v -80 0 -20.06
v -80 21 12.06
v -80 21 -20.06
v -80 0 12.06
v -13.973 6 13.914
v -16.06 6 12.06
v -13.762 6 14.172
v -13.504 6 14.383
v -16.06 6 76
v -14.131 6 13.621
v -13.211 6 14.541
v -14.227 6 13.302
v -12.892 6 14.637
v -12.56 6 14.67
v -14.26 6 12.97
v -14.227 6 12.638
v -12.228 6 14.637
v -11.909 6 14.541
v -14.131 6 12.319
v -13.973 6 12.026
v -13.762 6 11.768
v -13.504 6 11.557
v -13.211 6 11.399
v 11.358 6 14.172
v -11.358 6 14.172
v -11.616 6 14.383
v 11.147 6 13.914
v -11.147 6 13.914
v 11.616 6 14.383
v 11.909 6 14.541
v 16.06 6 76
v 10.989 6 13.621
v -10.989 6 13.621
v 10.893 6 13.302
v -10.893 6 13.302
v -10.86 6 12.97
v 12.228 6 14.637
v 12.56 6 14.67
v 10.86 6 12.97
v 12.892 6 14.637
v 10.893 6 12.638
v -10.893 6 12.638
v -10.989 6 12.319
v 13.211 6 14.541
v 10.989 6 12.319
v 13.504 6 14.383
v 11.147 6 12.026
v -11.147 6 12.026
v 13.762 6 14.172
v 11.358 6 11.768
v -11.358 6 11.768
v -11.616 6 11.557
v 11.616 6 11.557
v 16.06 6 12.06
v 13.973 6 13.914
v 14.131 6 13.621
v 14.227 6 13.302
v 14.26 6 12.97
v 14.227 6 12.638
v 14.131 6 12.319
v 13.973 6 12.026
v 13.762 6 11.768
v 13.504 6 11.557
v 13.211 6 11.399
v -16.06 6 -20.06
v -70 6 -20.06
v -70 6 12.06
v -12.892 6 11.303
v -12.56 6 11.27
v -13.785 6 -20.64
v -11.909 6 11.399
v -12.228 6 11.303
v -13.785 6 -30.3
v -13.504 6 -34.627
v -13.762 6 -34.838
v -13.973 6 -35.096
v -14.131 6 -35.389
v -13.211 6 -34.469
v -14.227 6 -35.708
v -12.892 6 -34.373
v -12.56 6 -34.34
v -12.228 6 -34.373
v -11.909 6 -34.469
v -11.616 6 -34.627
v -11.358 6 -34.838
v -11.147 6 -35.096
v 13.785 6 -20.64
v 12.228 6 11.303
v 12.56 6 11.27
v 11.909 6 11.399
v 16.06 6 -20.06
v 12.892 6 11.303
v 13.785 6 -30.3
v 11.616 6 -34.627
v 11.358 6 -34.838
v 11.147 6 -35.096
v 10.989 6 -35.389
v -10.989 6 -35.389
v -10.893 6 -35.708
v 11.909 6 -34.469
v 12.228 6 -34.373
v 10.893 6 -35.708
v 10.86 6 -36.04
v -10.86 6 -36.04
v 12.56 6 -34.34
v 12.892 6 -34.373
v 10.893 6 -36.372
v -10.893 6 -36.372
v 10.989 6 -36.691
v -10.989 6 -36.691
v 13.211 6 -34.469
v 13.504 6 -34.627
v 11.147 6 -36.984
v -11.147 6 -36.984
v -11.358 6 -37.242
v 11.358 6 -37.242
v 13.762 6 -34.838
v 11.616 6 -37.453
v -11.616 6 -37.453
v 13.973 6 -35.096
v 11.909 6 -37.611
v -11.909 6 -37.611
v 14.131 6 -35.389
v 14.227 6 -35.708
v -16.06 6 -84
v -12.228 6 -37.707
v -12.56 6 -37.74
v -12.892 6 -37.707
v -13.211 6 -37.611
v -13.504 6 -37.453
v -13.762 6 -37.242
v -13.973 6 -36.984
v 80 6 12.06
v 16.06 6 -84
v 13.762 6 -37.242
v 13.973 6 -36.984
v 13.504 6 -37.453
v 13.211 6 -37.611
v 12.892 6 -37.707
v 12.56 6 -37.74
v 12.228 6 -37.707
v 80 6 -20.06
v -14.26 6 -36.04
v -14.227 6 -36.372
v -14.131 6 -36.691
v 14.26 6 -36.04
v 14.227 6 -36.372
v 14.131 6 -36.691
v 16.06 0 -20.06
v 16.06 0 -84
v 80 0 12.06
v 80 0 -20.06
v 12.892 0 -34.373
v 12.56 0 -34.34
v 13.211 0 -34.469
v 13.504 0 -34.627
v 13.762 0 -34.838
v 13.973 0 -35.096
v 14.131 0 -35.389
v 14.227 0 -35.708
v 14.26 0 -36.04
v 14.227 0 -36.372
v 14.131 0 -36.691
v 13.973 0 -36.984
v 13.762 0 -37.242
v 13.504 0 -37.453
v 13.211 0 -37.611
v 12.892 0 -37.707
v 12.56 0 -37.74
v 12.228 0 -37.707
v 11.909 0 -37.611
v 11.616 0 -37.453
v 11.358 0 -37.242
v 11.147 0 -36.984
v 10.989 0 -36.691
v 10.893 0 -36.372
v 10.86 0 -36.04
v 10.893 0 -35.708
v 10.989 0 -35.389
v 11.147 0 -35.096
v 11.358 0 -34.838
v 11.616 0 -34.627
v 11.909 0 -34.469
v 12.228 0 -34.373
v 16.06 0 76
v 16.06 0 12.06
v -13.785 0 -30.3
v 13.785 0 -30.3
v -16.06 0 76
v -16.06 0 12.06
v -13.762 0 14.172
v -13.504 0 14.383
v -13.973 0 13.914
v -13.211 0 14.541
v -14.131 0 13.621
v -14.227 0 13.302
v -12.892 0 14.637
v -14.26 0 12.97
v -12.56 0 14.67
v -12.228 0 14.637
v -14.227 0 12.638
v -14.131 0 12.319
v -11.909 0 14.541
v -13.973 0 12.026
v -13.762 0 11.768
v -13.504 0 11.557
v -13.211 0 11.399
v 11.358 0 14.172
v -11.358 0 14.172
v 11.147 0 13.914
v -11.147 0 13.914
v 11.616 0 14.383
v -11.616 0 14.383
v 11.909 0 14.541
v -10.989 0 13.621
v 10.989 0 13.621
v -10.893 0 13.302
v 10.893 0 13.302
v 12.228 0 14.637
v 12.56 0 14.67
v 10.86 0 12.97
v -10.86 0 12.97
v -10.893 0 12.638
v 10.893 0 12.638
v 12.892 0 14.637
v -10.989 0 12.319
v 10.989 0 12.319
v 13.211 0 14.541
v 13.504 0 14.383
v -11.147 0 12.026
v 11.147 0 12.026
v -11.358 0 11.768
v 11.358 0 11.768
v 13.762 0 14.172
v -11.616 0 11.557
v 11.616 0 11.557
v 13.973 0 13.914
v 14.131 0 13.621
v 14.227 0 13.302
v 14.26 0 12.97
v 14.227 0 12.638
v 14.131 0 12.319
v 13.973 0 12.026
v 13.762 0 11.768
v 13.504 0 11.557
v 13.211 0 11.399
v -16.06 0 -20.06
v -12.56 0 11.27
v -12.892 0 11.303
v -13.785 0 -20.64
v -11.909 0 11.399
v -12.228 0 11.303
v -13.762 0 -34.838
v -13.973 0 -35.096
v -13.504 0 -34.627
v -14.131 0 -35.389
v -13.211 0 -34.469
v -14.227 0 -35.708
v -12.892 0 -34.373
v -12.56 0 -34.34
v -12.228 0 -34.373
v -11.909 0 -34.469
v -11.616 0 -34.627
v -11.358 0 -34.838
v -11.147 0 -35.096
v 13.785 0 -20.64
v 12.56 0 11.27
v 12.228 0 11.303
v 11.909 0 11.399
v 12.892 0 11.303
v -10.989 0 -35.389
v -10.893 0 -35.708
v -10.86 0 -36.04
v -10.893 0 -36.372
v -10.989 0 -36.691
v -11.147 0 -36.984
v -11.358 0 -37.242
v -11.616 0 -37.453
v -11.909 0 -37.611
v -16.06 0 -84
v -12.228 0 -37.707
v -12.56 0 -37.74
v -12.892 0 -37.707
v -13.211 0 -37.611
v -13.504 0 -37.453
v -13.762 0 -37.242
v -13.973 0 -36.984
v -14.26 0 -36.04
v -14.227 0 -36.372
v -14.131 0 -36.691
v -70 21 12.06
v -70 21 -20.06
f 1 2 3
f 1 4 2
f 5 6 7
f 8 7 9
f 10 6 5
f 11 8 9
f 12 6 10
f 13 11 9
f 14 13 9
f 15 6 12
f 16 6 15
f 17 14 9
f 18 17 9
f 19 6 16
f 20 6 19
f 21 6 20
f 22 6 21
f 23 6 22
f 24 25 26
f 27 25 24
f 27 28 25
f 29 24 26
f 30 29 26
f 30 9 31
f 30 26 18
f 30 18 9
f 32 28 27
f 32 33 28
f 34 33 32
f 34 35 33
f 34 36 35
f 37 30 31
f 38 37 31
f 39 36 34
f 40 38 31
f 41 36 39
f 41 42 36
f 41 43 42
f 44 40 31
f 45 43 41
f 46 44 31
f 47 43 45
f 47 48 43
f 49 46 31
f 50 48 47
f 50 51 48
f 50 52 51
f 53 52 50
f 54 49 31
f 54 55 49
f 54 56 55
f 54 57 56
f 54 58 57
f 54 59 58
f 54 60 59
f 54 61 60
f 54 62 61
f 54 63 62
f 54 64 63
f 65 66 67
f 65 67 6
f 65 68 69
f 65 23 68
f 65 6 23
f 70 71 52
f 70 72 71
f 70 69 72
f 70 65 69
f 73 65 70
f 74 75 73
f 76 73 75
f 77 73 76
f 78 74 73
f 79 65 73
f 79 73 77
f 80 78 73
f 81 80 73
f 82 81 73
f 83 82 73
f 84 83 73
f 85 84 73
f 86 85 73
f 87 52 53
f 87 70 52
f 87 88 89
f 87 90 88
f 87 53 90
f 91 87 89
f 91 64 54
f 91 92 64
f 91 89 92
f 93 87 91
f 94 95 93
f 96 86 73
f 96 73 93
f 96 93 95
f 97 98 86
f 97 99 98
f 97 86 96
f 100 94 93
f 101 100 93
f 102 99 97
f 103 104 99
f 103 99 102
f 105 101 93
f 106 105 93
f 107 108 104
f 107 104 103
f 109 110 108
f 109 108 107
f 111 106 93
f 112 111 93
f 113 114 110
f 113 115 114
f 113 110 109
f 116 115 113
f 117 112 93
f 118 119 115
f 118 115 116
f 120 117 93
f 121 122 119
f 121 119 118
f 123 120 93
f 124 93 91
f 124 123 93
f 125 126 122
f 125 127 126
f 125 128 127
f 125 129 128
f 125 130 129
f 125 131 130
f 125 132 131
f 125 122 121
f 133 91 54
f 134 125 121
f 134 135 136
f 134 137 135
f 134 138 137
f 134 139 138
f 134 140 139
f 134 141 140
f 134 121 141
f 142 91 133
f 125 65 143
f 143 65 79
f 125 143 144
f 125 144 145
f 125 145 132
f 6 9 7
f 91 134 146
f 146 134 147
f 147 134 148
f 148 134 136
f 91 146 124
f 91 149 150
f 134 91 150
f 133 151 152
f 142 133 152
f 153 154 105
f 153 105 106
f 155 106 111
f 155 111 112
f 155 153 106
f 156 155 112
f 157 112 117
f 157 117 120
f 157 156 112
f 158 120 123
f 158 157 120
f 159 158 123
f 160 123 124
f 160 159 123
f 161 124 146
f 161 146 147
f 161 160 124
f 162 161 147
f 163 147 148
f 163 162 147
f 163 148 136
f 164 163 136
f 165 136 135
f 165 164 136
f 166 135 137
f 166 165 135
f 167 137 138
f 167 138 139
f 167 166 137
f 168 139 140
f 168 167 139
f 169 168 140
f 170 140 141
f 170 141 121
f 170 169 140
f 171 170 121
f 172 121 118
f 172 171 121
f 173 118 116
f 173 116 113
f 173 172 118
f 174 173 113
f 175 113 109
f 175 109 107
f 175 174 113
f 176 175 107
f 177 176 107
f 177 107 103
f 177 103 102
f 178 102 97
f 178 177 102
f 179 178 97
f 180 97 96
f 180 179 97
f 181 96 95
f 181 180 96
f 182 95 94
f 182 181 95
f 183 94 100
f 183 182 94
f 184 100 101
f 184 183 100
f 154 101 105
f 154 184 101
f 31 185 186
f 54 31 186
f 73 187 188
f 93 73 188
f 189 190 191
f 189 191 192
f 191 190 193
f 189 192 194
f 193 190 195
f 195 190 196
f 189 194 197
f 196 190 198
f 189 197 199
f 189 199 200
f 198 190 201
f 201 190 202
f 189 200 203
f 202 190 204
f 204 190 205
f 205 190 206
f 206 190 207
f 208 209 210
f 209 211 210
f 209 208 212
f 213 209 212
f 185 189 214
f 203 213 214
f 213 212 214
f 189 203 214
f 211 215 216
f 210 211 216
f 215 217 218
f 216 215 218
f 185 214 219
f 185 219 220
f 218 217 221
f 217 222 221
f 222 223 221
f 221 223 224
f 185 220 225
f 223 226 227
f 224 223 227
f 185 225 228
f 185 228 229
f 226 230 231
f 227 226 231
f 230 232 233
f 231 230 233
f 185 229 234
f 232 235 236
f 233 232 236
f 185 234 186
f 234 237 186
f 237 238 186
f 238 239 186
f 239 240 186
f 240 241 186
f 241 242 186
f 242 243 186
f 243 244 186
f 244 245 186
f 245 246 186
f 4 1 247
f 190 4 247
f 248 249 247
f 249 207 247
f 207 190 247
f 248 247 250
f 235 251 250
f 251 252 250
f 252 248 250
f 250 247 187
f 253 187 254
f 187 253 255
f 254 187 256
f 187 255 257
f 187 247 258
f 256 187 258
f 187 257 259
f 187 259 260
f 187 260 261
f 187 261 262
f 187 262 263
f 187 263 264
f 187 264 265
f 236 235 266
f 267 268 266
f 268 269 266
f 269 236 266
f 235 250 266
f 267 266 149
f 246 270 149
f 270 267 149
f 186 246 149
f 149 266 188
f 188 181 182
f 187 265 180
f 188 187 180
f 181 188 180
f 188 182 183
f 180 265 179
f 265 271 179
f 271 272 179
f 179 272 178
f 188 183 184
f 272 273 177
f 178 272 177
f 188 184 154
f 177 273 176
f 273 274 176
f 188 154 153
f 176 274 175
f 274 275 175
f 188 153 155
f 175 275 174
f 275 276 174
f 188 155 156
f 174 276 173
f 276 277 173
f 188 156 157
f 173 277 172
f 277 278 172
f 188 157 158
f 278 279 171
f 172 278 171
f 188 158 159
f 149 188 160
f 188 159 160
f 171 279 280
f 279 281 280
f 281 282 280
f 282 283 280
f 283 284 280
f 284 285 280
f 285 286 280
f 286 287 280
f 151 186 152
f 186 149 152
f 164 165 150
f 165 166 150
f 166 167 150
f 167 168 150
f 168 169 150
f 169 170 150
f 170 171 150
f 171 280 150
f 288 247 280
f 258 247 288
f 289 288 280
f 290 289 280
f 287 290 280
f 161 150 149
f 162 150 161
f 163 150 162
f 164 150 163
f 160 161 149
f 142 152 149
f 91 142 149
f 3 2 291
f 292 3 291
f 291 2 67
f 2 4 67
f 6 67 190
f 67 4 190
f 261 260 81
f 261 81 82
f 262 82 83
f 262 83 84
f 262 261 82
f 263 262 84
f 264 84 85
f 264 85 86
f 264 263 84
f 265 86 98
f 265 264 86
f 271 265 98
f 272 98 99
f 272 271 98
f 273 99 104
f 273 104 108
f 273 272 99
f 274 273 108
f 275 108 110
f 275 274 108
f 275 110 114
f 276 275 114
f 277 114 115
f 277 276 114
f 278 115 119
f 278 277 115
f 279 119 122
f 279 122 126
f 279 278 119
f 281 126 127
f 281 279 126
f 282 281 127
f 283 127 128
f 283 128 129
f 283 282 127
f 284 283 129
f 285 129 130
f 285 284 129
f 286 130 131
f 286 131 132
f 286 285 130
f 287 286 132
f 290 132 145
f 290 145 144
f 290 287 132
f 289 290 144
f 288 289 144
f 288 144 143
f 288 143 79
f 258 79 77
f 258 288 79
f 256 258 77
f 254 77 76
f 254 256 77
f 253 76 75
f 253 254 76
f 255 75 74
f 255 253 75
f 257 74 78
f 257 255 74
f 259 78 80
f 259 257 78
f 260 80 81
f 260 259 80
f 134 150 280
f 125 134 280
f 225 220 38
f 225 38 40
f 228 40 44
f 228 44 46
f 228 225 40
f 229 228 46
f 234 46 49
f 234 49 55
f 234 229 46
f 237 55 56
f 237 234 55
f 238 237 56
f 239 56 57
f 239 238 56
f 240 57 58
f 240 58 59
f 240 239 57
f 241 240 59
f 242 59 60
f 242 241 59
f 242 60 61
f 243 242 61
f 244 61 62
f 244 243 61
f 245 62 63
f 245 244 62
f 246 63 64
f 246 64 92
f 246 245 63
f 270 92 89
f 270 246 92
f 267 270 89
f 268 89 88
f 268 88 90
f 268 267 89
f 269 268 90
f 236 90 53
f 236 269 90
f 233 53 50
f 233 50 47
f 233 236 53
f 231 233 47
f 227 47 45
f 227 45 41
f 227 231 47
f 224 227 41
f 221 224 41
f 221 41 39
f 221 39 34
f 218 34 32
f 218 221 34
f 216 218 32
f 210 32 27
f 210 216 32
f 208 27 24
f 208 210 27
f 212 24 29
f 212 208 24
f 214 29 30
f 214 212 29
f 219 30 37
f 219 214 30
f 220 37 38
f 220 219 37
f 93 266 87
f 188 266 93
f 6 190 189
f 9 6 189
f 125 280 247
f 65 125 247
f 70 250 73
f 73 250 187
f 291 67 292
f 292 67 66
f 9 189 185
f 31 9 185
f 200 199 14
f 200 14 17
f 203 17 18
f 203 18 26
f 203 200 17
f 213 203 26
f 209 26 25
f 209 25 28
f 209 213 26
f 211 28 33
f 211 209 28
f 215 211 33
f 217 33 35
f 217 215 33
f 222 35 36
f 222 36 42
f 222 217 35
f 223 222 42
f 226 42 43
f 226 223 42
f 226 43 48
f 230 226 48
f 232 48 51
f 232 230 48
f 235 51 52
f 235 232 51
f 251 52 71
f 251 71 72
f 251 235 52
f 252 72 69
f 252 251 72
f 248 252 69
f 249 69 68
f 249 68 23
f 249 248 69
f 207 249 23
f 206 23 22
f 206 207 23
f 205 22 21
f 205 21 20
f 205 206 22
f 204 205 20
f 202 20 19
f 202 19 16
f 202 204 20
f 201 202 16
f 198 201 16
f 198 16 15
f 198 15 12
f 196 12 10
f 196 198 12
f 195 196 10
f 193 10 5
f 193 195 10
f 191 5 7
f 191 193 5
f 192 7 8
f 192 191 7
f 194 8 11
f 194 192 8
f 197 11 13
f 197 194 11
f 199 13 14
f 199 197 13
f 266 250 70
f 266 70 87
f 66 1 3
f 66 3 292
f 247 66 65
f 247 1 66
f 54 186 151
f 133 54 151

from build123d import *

# Parameters (mm, degrees)
SKETCH21_R           = 1.7
SKETCH21_W           = 27.57
SKETCH21_H           = 9.66
BOSS_EXTRUDE18_DEPTH = 6
SKETCH22_W           = 10
SKETCH22_H           = 32.12
BOSS_EXTRUDE19_DEPTH = 15


with BuildPart() as part:
    # Sketch21 → Boss-Extrude18 (new body)
    with BuildSketch(Plane(origin=(0, 0, 0), x_dir=(1, 0, 0), z_dir=(0, 1, 0))):
        Polygon((0, 84), (-16.06, 84), (-16.06, 20.06), (-80, 20.06), (-80, 4), (-80, -12.06), (-16.06, -12.06), (-16.06, -76), (0, -76), (16.06, -76), (16.06, -12.06), (80, -12.06), (80, 4), (80, 20.06), (16.06, 20.06), (16.06, 84), align=None)
        with Locations(Location((-12.56, 36.04, 0), (0, 0, 270))):
            Circle(SKETCH21_R, mode=Mode.SUBTRACT)
        with Locations(Location((12.56, 36.04, 0), (0, 0, 270))):
            Circle(SKETCH21_R, mode=Mode.SUBTRACT)
        with Locations(Location((12.56, -12.97, 0), (0, 0, 270))):
            Circle(SKETCH21_R, mode=Mode.SUBTRACT)
        with Locations(Location((-12.56, -12.97, 0), (0, 0, 270))):
            Circle(SKETCH21_R, mode=Mode.SUBTRACT)
        with Locations((0, 25.47)):
            Rectangle(SKETCH21_W, SKETCH21_H, mode=Mode.SUBTRACT)
    extrude(amount=BOSS_EXTRUDE18_DEPTH)

    # Sketch22 → Boss-Extrude19 (add)
    with BuildSketch(Plane(origin=(0, 6, 0), x_dir=(1, 0, 0), z_dir=(0, 1, 0))):
        with Locations((-75, 4)):
            Rectangle(SKETCH22_W, SKETCH22_H)
    extrude(amount=BOSS_EXTRUDE19_DEPTH)


solid = part.part
